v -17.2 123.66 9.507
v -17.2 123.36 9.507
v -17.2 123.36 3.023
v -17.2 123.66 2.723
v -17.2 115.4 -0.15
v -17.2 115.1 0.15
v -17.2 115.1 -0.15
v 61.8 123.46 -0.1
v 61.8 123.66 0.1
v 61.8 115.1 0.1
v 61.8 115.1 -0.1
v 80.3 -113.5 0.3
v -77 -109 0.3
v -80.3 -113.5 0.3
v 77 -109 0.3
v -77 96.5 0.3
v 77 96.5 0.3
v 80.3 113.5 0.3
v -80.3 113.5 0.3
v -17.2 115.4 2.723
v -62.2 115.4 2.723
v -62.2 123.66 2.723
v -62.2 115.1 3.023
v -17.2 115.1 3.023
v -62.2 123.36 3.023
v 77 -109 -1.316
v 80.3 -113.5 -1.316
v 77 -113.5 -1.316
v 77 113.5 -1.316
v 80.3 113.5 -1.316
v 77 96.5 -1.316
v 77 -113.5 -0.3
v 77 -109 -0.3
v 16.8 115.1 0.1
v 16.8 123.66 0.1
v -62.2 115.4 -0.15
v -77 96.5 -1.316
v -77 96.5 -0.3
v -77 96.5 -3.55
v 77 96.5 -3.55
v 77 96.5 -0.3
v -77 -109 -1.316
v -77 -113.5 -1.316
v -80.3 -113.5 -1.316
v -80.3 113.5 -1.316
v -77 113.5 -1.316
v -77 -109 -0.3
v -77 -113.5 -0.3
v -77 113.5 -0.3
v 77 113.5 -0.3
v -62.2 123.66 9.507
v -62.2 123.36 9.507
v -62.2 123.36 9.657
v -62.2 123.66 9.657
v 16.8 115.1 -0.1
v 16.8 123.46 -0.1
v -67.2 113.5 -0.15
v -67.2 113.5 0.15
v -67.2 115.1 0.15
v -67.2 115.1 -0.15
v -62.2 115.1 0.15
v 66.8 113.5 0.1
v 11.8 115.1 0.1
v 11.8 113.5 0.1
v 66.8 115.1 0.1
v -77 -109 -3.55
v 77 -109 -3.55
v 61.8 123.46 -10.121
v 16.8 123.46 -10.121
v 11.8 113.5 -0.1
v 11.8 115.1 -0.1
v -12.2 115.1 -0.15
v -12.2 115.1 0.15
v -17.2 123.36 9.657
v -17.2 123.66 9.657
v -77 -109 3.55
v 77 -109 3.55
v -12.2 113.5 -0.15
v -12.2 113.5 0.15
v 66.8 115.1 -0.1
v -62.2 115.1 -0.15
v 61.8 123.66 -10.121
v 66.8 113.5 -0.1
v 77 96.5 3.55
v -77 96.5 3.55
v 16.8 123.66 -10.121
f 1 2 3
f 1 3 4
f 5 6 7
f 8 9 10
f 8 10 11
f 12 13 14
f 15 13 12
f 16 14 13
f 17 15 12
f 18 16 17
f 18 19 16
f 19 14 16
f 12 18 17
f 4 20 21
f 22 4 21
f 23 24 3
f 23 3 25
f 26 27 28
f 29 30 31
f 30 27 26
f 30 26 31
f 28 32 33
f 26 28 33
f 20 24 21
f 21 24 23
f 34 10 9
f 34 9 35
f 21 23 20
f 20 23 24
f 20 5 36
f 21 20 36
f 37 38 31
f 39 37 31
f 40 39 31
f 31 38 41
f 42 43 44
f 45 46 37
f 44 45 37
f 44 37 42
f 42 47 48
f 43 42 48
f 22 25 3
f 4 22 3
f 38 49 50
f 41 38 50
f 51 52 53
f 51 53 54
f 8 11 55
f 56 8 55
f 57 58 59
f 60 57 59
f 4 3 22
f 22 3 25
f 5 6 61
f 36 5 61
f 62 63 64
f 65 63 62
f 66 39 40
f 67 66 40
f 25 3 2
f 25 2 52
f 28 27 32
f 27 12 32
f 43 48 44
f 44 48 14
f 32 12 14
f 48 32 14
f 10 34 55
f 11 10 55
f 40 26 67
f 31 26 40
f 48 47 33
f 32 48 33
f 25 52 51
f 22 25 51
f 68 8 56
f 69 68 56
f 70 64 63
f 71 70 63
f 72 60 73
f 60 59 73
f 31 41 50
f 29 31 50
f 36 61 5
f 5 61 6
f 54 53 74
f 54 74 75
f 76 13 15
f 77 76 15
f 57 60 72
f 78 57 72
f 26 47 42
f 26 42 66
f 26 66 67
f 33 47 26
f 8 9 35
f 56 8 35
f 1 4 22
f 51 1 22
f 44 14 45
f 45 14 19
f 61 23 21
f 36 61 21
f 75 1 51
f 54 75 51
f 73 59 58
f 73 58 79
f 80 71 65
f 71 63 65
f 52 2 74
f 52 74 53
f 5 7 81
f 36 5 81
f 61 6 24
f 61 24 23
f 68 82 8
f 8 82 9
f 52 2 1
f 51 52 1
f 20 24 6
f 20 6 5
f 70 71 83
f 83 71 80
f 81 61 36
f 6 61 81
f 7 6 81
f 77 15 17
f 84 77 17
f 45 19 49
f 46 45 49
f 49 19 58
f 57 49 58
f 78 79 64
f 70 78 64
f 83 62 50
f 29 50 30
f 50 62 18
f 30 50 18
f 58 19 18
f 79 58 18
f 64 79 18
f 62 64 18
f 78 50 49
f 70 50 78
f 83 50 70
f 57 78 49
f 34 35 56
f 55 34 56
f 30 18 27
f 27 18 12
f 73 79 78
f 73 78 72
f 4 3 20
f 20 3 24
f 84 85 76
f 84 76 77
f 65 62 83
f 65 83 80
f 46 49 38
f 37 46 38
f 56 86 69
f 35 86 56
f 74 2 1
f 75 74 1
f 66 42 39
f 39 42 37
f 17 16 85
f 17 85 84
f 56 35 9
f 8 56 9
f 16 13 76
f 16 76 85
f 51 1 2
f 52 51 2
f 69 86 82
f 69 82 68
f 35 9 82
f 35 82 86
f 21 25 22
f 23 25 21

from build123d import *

# Parameters (mm, degrees)
SKETCH1_W                    = 160.6
SKETCH1_H                    = 227
INSULATION_DEPTH             = 0.3
INSULATION_DEPTH_BACK        = 0.3
SKETCH2_W                    = 154
SKETCH2_H                    = 205.5
MAIN_BODY_DEPTH              = 3.55
MAIN_BODY_DEPTH_BACK         = 3.55
SIDE_FOLDS_DEPTH             = 1.016
SKETCH6_W                    = 55
SKETCH6_H                    = 18.6
NEGATIVE_TAB_BASE_DEPTH      = 0.1
NEGATIVE_TAB_BASE_DEPTH_BACK = 0.1
SKETCH7_W                    = 55
SKETCH7_H                    = 18.6
POSITIVE_TAB_BASE_DEPTH      = 0.15
POSITIVE_TAB_BASE_DEPTH_BACK = 0.15
SKETCH110_W                  = 0.3
SKETCH110_H                  = 45
POSITIVE_TAB_DEPTH           = 23.650499994
SKETCH110_ON_SEGMENT_2_W     = 0.3
SKETCH110_ON_SEGMENT_2_H     = 45
POSITIVE_TAB_2_DEPTH         = 49.874449989
SKETCH110_ON_SEGMENT_3_W     = 0.3
SKETCH110_ON_SEGMENT_3_H     = 45
POSITIVE_TAB_3_DEPTH         = 55.260999989
SKETCH110_ON_SEGMENT_4_W     = 0.3
SKETCH110_ON_SEGMENT_4_H     = 45
POSITIVE_TAB_4_DEPTH         = 31.133774994
SKETCH110_ON_SEGMENT_5_W     = 0.3
SKETCH110_ON_SEGMENT_5_H     = 45
POSITIVE_TAB_5_DEPTH         = 1.15
SKETCH113_W                  = 0.2
SKETCH113_H                  = 45
NEGATIVE_TAB_DEPTH           = 31.960222221
SKETCH113_ON_SEGMENT_2_W     = 0.2
SKETCH113_ON_SEGMENT_2_H     = 45
NEGATIVE_TAB_2_DEPTH         = 33.621222221


with BuildPart() as part:
    # Sketch1 → Insulation (new, two sides)
    with BuildSketch(Plane.XY) as insulation_sk:
        Rectangle(SKETCH1_W, SKETCH1_H)
    extrude(amount=INSULATION_DEPTH)
    extrude(insulation_sk.sketch, amount=-INSULATION_DEPTH_BACK)

    # Sketch2 → Main Body (add, two sides)
    with BuildSketch(Plane.XY) as main_body_sk:
        with Locations((0, -6.25)):
            Rectangle(SKETCH2_W, SKETCH2_H)
    extrude(amount=MAIN_BODY_DEPTH)
    extrude(main_body_sk.sketch, amount=-MAIN_BODY_DEPTH_BACK)

    # Sketch5 → Side Folds (add)
    with BuildSketch(Plane(origin=(0, 0, -0.3), x_dir=(-1, 0, 0), z_dir=(0, 0, -1))):
        Polygon((-77, -109), (-77, 96.5), (-77, 113.5), (-80.3, 113.5), (-80.3, -113.5), (-77, -113.5), align=None)
        Polygon((77, 113.5), (77, 96.5), (77, -109), (77, -113.5), (80.3, -113.5), (80.3, 113.5), align=None)
    extrude(amount=SIDE_FOLDS_DEPTH)

    # Sketch6 → Negative Tab Base (add, two sides)
    with BuildSketch(Plane.XY) as negative_tab_base_sk:
        with Locations((39.3, 105.8)):
            Rectangle(SKETCH6_W, SKETCH6_H)
    extrude(amount=NEGATIVE_TAB_BASE_DEPTH)
    extrude(negative_tab_base_sk.sketch, amount=-NEGATIVE_TAB_BASE_DEPTH_BACK)

    # Sketch7 → Positive Tab Base (add, two sides)
    with BuildSketch(Plane.XY) as positive_tab_base_sk:
        with Locations((-39.7, 105.8)):
            Rectangle(SKETCH7_W, SKETCH7_H)
    extrude(amount=POSITIVE_TAB_BASE_DEPTH)
    extrude(positive_tab_base_sk.sketch, amount=-POSITIVE_TAB_BASE_DEPTH_BACK)


with BuildPart() as body_2:
    # Sketch110 → Positive Tab (new body)
    with BuildSketch(Plane(origin=(-39.7, 115.1, 0), x_dir=(0, 0, -1), z_dir=(0, 1, 0))):
        Rectangle(SKETCH110_W, SKETCH110_H)
    extrude(amount=POSITIVE_TAB_DEPTH)

    # Positive Tab mitre 1
    split(bisect_by=Plane(origin=(-39.7, 115.25, 0), x_dir=(1, 0, 0), z_dir=(0, -0.707106781, -0.707106781)), keep=Keep.TOP)


with BuildPart() as body_3:
    # Sketch110 on segment 2 (carried to segment 2) → Positive Tab 2 (new body)
    with BuildSketch(Plane(origin=(-39.7, 115.25, -23.500499994), x_dir=(0, 1, 0), z_dir=(0, 0, 1))):
        Rectangle(SKETCH110_ON_SEGMENT_2_W, SKETCH110_ON_SEGMENT_2_H)
    extrude(amount=POSITIVE_TAB_2_DEPTH)

    # Positive Tab 2 mitre 1
    split(bisect_by=Plane(origin=(-39.7, 115.25, 0), x_dir=(-1, 0, 0), z_dir=(0, 0.707106781, 0.707106781)), keep=Keep.TOP)

    # Positive Tab 2 mitre 2
    split(bisect_by=Plane(origin=(-39.7, 115.25, 2.87345), x_dir=(1, 0, 0), z_dir=(0, -0.707106781, -0.707106781)), keep=Keep.TOP)


with BuildPart() as body_4:
    # Sketch110 on segment 3 (carried to segment 3) → Positive Tab 3 (new body)
    with BuildSketch(Plane(origin=(-39.7, 91.749500006, 2.87345), x_dir=(0, 0, -1), z_dir=(0, 1, 0))):
        Rectangle(SKETCH110_ON_SEGMENT_3_W, SKETCH110_ON_SEGMENT_3_H)
    extrude(amount=POSITIVE_TAB_3_DEPTH)

    # Positive Tab 3 mitre 1
    split(bisect_by=Plane(origin=(-39.7, 115.25, 2.87345), x_dir=(-1, 0, 0), z_dir=(0, 0.707106781, 0.707106781)), keep=Keep.TOP)

    # Positive Tab 3 mitre 2
    split(bisect_by=Plane(origin=(-39.7, 123.51, 2.87345), x_dir=(1, 0, 0), z_dir=(0, -0.707106781, -0.707106781)), keep=Keep.TOP)


with BuildPart() as body_5:
    # Sketch110 on segment 4 (carried to segment 4) → Positive Tab 4 (new body)
    with BuildSketch(Plane(origin=(-39.7, 123.51, -20.627049994), x_dir=(0, 1, 0), z_dir=(0, 0, 1))):
        Rectangle(SKETCH110_ON_SEGMENT_4_W, SKETCH110_ON_SEGMENT_4_H)
    extrude(amount=POSITIVE_TAB_4_DEPTH)

    # Positive Tab 4 mitre 1
    split(bisect_by=Plane(origin=(-39.7, 123.51, 2.87345), x_dir=(-1, 0, 0), z_dir=(0, 0.707106781, 0.707106781)), keep=Keep.TOP)

    # Positive Tab 4 mitre 2
    split(bisect_by=Plane(origin=(-39.7, 123.51, 9.506725), x_dir=(0, 1, 0), z_dir=(0, 0, -1)), keep=Keep.TOP)


with BuildPart() as body_6:
    # Sketch110 on segment 5 (carried to segment 5) → Positive Tab 5 (new body)
    with BuildSketch(Plane(origin=(-39.7, 123.51, 8.506725), x_dir=(0, 1, 0), z_dir=(0, 0, 1))):
        Rectangle(SKETCH110_ON_SEGMENT_5_W, SKETCH110_ON_SEGMENT_5_H)
    extrude(amount=POSITIVE_TAB_5_DEPTH)

    # Positive Tab 5 mitre 1
    split(bisect_by=Plane(origin=(-39.7, 123.51, 9.506725), x_dir=(0, -1, 0), z_dir=(0, 0, 1)), keep=Keep.TOP)


with BuildPart() as body_7:
    # Sketch113 → Negative Tab (new body)
    with BuildSketch(Plane(origin=(39.3, 115.1, 0), x_dir=(0, 0, -1), z_dir=(0, 1, 0))):
        Rectangle(SKETCH113_W, SKETCH113_H)
    extrude(amount=NEGATIVE_TAB_DEPTH)

    # Negative Tab mitre 1
    split(bisect_by=Plane(origin=(39.3, 123.56, 0), x_dir=(1, 0, 0), z_dir=(0, -0.707106781, 0.707106781)), keep=Keep.TOP)


with BuildPart() as body_8:
    # Sketch113 on segment 2 (carried to segment 2) → Negative Tab 2 (new body)
    with BuildSketch(Plane(origin=(39.3, 123.56, 23.500222221), x_dir=(0, -1, 0), z_dir=(0, 0, -1))):
        Rectangle(SKETCH113_ON_SEGMENT_2_W, SKETCH113_ON_SEGMENT_2_H)
    extrude(amount=NEGATIVE_TAB_2_DEPTH)

    # Negative Tab 2 mitre 1
    split(bisect_by=Plane(origin=(39.3, 123.56, 0), x_dir=(-1, 0, 0), z_dir=(0, 0.707106781, -0.707106781)), keep=Keep.TOP)


solid = Compound([part.part, body_2.part, body_3.part, body_4.part, body_5.part, body_6.part, body_7.part, body_8.part])
